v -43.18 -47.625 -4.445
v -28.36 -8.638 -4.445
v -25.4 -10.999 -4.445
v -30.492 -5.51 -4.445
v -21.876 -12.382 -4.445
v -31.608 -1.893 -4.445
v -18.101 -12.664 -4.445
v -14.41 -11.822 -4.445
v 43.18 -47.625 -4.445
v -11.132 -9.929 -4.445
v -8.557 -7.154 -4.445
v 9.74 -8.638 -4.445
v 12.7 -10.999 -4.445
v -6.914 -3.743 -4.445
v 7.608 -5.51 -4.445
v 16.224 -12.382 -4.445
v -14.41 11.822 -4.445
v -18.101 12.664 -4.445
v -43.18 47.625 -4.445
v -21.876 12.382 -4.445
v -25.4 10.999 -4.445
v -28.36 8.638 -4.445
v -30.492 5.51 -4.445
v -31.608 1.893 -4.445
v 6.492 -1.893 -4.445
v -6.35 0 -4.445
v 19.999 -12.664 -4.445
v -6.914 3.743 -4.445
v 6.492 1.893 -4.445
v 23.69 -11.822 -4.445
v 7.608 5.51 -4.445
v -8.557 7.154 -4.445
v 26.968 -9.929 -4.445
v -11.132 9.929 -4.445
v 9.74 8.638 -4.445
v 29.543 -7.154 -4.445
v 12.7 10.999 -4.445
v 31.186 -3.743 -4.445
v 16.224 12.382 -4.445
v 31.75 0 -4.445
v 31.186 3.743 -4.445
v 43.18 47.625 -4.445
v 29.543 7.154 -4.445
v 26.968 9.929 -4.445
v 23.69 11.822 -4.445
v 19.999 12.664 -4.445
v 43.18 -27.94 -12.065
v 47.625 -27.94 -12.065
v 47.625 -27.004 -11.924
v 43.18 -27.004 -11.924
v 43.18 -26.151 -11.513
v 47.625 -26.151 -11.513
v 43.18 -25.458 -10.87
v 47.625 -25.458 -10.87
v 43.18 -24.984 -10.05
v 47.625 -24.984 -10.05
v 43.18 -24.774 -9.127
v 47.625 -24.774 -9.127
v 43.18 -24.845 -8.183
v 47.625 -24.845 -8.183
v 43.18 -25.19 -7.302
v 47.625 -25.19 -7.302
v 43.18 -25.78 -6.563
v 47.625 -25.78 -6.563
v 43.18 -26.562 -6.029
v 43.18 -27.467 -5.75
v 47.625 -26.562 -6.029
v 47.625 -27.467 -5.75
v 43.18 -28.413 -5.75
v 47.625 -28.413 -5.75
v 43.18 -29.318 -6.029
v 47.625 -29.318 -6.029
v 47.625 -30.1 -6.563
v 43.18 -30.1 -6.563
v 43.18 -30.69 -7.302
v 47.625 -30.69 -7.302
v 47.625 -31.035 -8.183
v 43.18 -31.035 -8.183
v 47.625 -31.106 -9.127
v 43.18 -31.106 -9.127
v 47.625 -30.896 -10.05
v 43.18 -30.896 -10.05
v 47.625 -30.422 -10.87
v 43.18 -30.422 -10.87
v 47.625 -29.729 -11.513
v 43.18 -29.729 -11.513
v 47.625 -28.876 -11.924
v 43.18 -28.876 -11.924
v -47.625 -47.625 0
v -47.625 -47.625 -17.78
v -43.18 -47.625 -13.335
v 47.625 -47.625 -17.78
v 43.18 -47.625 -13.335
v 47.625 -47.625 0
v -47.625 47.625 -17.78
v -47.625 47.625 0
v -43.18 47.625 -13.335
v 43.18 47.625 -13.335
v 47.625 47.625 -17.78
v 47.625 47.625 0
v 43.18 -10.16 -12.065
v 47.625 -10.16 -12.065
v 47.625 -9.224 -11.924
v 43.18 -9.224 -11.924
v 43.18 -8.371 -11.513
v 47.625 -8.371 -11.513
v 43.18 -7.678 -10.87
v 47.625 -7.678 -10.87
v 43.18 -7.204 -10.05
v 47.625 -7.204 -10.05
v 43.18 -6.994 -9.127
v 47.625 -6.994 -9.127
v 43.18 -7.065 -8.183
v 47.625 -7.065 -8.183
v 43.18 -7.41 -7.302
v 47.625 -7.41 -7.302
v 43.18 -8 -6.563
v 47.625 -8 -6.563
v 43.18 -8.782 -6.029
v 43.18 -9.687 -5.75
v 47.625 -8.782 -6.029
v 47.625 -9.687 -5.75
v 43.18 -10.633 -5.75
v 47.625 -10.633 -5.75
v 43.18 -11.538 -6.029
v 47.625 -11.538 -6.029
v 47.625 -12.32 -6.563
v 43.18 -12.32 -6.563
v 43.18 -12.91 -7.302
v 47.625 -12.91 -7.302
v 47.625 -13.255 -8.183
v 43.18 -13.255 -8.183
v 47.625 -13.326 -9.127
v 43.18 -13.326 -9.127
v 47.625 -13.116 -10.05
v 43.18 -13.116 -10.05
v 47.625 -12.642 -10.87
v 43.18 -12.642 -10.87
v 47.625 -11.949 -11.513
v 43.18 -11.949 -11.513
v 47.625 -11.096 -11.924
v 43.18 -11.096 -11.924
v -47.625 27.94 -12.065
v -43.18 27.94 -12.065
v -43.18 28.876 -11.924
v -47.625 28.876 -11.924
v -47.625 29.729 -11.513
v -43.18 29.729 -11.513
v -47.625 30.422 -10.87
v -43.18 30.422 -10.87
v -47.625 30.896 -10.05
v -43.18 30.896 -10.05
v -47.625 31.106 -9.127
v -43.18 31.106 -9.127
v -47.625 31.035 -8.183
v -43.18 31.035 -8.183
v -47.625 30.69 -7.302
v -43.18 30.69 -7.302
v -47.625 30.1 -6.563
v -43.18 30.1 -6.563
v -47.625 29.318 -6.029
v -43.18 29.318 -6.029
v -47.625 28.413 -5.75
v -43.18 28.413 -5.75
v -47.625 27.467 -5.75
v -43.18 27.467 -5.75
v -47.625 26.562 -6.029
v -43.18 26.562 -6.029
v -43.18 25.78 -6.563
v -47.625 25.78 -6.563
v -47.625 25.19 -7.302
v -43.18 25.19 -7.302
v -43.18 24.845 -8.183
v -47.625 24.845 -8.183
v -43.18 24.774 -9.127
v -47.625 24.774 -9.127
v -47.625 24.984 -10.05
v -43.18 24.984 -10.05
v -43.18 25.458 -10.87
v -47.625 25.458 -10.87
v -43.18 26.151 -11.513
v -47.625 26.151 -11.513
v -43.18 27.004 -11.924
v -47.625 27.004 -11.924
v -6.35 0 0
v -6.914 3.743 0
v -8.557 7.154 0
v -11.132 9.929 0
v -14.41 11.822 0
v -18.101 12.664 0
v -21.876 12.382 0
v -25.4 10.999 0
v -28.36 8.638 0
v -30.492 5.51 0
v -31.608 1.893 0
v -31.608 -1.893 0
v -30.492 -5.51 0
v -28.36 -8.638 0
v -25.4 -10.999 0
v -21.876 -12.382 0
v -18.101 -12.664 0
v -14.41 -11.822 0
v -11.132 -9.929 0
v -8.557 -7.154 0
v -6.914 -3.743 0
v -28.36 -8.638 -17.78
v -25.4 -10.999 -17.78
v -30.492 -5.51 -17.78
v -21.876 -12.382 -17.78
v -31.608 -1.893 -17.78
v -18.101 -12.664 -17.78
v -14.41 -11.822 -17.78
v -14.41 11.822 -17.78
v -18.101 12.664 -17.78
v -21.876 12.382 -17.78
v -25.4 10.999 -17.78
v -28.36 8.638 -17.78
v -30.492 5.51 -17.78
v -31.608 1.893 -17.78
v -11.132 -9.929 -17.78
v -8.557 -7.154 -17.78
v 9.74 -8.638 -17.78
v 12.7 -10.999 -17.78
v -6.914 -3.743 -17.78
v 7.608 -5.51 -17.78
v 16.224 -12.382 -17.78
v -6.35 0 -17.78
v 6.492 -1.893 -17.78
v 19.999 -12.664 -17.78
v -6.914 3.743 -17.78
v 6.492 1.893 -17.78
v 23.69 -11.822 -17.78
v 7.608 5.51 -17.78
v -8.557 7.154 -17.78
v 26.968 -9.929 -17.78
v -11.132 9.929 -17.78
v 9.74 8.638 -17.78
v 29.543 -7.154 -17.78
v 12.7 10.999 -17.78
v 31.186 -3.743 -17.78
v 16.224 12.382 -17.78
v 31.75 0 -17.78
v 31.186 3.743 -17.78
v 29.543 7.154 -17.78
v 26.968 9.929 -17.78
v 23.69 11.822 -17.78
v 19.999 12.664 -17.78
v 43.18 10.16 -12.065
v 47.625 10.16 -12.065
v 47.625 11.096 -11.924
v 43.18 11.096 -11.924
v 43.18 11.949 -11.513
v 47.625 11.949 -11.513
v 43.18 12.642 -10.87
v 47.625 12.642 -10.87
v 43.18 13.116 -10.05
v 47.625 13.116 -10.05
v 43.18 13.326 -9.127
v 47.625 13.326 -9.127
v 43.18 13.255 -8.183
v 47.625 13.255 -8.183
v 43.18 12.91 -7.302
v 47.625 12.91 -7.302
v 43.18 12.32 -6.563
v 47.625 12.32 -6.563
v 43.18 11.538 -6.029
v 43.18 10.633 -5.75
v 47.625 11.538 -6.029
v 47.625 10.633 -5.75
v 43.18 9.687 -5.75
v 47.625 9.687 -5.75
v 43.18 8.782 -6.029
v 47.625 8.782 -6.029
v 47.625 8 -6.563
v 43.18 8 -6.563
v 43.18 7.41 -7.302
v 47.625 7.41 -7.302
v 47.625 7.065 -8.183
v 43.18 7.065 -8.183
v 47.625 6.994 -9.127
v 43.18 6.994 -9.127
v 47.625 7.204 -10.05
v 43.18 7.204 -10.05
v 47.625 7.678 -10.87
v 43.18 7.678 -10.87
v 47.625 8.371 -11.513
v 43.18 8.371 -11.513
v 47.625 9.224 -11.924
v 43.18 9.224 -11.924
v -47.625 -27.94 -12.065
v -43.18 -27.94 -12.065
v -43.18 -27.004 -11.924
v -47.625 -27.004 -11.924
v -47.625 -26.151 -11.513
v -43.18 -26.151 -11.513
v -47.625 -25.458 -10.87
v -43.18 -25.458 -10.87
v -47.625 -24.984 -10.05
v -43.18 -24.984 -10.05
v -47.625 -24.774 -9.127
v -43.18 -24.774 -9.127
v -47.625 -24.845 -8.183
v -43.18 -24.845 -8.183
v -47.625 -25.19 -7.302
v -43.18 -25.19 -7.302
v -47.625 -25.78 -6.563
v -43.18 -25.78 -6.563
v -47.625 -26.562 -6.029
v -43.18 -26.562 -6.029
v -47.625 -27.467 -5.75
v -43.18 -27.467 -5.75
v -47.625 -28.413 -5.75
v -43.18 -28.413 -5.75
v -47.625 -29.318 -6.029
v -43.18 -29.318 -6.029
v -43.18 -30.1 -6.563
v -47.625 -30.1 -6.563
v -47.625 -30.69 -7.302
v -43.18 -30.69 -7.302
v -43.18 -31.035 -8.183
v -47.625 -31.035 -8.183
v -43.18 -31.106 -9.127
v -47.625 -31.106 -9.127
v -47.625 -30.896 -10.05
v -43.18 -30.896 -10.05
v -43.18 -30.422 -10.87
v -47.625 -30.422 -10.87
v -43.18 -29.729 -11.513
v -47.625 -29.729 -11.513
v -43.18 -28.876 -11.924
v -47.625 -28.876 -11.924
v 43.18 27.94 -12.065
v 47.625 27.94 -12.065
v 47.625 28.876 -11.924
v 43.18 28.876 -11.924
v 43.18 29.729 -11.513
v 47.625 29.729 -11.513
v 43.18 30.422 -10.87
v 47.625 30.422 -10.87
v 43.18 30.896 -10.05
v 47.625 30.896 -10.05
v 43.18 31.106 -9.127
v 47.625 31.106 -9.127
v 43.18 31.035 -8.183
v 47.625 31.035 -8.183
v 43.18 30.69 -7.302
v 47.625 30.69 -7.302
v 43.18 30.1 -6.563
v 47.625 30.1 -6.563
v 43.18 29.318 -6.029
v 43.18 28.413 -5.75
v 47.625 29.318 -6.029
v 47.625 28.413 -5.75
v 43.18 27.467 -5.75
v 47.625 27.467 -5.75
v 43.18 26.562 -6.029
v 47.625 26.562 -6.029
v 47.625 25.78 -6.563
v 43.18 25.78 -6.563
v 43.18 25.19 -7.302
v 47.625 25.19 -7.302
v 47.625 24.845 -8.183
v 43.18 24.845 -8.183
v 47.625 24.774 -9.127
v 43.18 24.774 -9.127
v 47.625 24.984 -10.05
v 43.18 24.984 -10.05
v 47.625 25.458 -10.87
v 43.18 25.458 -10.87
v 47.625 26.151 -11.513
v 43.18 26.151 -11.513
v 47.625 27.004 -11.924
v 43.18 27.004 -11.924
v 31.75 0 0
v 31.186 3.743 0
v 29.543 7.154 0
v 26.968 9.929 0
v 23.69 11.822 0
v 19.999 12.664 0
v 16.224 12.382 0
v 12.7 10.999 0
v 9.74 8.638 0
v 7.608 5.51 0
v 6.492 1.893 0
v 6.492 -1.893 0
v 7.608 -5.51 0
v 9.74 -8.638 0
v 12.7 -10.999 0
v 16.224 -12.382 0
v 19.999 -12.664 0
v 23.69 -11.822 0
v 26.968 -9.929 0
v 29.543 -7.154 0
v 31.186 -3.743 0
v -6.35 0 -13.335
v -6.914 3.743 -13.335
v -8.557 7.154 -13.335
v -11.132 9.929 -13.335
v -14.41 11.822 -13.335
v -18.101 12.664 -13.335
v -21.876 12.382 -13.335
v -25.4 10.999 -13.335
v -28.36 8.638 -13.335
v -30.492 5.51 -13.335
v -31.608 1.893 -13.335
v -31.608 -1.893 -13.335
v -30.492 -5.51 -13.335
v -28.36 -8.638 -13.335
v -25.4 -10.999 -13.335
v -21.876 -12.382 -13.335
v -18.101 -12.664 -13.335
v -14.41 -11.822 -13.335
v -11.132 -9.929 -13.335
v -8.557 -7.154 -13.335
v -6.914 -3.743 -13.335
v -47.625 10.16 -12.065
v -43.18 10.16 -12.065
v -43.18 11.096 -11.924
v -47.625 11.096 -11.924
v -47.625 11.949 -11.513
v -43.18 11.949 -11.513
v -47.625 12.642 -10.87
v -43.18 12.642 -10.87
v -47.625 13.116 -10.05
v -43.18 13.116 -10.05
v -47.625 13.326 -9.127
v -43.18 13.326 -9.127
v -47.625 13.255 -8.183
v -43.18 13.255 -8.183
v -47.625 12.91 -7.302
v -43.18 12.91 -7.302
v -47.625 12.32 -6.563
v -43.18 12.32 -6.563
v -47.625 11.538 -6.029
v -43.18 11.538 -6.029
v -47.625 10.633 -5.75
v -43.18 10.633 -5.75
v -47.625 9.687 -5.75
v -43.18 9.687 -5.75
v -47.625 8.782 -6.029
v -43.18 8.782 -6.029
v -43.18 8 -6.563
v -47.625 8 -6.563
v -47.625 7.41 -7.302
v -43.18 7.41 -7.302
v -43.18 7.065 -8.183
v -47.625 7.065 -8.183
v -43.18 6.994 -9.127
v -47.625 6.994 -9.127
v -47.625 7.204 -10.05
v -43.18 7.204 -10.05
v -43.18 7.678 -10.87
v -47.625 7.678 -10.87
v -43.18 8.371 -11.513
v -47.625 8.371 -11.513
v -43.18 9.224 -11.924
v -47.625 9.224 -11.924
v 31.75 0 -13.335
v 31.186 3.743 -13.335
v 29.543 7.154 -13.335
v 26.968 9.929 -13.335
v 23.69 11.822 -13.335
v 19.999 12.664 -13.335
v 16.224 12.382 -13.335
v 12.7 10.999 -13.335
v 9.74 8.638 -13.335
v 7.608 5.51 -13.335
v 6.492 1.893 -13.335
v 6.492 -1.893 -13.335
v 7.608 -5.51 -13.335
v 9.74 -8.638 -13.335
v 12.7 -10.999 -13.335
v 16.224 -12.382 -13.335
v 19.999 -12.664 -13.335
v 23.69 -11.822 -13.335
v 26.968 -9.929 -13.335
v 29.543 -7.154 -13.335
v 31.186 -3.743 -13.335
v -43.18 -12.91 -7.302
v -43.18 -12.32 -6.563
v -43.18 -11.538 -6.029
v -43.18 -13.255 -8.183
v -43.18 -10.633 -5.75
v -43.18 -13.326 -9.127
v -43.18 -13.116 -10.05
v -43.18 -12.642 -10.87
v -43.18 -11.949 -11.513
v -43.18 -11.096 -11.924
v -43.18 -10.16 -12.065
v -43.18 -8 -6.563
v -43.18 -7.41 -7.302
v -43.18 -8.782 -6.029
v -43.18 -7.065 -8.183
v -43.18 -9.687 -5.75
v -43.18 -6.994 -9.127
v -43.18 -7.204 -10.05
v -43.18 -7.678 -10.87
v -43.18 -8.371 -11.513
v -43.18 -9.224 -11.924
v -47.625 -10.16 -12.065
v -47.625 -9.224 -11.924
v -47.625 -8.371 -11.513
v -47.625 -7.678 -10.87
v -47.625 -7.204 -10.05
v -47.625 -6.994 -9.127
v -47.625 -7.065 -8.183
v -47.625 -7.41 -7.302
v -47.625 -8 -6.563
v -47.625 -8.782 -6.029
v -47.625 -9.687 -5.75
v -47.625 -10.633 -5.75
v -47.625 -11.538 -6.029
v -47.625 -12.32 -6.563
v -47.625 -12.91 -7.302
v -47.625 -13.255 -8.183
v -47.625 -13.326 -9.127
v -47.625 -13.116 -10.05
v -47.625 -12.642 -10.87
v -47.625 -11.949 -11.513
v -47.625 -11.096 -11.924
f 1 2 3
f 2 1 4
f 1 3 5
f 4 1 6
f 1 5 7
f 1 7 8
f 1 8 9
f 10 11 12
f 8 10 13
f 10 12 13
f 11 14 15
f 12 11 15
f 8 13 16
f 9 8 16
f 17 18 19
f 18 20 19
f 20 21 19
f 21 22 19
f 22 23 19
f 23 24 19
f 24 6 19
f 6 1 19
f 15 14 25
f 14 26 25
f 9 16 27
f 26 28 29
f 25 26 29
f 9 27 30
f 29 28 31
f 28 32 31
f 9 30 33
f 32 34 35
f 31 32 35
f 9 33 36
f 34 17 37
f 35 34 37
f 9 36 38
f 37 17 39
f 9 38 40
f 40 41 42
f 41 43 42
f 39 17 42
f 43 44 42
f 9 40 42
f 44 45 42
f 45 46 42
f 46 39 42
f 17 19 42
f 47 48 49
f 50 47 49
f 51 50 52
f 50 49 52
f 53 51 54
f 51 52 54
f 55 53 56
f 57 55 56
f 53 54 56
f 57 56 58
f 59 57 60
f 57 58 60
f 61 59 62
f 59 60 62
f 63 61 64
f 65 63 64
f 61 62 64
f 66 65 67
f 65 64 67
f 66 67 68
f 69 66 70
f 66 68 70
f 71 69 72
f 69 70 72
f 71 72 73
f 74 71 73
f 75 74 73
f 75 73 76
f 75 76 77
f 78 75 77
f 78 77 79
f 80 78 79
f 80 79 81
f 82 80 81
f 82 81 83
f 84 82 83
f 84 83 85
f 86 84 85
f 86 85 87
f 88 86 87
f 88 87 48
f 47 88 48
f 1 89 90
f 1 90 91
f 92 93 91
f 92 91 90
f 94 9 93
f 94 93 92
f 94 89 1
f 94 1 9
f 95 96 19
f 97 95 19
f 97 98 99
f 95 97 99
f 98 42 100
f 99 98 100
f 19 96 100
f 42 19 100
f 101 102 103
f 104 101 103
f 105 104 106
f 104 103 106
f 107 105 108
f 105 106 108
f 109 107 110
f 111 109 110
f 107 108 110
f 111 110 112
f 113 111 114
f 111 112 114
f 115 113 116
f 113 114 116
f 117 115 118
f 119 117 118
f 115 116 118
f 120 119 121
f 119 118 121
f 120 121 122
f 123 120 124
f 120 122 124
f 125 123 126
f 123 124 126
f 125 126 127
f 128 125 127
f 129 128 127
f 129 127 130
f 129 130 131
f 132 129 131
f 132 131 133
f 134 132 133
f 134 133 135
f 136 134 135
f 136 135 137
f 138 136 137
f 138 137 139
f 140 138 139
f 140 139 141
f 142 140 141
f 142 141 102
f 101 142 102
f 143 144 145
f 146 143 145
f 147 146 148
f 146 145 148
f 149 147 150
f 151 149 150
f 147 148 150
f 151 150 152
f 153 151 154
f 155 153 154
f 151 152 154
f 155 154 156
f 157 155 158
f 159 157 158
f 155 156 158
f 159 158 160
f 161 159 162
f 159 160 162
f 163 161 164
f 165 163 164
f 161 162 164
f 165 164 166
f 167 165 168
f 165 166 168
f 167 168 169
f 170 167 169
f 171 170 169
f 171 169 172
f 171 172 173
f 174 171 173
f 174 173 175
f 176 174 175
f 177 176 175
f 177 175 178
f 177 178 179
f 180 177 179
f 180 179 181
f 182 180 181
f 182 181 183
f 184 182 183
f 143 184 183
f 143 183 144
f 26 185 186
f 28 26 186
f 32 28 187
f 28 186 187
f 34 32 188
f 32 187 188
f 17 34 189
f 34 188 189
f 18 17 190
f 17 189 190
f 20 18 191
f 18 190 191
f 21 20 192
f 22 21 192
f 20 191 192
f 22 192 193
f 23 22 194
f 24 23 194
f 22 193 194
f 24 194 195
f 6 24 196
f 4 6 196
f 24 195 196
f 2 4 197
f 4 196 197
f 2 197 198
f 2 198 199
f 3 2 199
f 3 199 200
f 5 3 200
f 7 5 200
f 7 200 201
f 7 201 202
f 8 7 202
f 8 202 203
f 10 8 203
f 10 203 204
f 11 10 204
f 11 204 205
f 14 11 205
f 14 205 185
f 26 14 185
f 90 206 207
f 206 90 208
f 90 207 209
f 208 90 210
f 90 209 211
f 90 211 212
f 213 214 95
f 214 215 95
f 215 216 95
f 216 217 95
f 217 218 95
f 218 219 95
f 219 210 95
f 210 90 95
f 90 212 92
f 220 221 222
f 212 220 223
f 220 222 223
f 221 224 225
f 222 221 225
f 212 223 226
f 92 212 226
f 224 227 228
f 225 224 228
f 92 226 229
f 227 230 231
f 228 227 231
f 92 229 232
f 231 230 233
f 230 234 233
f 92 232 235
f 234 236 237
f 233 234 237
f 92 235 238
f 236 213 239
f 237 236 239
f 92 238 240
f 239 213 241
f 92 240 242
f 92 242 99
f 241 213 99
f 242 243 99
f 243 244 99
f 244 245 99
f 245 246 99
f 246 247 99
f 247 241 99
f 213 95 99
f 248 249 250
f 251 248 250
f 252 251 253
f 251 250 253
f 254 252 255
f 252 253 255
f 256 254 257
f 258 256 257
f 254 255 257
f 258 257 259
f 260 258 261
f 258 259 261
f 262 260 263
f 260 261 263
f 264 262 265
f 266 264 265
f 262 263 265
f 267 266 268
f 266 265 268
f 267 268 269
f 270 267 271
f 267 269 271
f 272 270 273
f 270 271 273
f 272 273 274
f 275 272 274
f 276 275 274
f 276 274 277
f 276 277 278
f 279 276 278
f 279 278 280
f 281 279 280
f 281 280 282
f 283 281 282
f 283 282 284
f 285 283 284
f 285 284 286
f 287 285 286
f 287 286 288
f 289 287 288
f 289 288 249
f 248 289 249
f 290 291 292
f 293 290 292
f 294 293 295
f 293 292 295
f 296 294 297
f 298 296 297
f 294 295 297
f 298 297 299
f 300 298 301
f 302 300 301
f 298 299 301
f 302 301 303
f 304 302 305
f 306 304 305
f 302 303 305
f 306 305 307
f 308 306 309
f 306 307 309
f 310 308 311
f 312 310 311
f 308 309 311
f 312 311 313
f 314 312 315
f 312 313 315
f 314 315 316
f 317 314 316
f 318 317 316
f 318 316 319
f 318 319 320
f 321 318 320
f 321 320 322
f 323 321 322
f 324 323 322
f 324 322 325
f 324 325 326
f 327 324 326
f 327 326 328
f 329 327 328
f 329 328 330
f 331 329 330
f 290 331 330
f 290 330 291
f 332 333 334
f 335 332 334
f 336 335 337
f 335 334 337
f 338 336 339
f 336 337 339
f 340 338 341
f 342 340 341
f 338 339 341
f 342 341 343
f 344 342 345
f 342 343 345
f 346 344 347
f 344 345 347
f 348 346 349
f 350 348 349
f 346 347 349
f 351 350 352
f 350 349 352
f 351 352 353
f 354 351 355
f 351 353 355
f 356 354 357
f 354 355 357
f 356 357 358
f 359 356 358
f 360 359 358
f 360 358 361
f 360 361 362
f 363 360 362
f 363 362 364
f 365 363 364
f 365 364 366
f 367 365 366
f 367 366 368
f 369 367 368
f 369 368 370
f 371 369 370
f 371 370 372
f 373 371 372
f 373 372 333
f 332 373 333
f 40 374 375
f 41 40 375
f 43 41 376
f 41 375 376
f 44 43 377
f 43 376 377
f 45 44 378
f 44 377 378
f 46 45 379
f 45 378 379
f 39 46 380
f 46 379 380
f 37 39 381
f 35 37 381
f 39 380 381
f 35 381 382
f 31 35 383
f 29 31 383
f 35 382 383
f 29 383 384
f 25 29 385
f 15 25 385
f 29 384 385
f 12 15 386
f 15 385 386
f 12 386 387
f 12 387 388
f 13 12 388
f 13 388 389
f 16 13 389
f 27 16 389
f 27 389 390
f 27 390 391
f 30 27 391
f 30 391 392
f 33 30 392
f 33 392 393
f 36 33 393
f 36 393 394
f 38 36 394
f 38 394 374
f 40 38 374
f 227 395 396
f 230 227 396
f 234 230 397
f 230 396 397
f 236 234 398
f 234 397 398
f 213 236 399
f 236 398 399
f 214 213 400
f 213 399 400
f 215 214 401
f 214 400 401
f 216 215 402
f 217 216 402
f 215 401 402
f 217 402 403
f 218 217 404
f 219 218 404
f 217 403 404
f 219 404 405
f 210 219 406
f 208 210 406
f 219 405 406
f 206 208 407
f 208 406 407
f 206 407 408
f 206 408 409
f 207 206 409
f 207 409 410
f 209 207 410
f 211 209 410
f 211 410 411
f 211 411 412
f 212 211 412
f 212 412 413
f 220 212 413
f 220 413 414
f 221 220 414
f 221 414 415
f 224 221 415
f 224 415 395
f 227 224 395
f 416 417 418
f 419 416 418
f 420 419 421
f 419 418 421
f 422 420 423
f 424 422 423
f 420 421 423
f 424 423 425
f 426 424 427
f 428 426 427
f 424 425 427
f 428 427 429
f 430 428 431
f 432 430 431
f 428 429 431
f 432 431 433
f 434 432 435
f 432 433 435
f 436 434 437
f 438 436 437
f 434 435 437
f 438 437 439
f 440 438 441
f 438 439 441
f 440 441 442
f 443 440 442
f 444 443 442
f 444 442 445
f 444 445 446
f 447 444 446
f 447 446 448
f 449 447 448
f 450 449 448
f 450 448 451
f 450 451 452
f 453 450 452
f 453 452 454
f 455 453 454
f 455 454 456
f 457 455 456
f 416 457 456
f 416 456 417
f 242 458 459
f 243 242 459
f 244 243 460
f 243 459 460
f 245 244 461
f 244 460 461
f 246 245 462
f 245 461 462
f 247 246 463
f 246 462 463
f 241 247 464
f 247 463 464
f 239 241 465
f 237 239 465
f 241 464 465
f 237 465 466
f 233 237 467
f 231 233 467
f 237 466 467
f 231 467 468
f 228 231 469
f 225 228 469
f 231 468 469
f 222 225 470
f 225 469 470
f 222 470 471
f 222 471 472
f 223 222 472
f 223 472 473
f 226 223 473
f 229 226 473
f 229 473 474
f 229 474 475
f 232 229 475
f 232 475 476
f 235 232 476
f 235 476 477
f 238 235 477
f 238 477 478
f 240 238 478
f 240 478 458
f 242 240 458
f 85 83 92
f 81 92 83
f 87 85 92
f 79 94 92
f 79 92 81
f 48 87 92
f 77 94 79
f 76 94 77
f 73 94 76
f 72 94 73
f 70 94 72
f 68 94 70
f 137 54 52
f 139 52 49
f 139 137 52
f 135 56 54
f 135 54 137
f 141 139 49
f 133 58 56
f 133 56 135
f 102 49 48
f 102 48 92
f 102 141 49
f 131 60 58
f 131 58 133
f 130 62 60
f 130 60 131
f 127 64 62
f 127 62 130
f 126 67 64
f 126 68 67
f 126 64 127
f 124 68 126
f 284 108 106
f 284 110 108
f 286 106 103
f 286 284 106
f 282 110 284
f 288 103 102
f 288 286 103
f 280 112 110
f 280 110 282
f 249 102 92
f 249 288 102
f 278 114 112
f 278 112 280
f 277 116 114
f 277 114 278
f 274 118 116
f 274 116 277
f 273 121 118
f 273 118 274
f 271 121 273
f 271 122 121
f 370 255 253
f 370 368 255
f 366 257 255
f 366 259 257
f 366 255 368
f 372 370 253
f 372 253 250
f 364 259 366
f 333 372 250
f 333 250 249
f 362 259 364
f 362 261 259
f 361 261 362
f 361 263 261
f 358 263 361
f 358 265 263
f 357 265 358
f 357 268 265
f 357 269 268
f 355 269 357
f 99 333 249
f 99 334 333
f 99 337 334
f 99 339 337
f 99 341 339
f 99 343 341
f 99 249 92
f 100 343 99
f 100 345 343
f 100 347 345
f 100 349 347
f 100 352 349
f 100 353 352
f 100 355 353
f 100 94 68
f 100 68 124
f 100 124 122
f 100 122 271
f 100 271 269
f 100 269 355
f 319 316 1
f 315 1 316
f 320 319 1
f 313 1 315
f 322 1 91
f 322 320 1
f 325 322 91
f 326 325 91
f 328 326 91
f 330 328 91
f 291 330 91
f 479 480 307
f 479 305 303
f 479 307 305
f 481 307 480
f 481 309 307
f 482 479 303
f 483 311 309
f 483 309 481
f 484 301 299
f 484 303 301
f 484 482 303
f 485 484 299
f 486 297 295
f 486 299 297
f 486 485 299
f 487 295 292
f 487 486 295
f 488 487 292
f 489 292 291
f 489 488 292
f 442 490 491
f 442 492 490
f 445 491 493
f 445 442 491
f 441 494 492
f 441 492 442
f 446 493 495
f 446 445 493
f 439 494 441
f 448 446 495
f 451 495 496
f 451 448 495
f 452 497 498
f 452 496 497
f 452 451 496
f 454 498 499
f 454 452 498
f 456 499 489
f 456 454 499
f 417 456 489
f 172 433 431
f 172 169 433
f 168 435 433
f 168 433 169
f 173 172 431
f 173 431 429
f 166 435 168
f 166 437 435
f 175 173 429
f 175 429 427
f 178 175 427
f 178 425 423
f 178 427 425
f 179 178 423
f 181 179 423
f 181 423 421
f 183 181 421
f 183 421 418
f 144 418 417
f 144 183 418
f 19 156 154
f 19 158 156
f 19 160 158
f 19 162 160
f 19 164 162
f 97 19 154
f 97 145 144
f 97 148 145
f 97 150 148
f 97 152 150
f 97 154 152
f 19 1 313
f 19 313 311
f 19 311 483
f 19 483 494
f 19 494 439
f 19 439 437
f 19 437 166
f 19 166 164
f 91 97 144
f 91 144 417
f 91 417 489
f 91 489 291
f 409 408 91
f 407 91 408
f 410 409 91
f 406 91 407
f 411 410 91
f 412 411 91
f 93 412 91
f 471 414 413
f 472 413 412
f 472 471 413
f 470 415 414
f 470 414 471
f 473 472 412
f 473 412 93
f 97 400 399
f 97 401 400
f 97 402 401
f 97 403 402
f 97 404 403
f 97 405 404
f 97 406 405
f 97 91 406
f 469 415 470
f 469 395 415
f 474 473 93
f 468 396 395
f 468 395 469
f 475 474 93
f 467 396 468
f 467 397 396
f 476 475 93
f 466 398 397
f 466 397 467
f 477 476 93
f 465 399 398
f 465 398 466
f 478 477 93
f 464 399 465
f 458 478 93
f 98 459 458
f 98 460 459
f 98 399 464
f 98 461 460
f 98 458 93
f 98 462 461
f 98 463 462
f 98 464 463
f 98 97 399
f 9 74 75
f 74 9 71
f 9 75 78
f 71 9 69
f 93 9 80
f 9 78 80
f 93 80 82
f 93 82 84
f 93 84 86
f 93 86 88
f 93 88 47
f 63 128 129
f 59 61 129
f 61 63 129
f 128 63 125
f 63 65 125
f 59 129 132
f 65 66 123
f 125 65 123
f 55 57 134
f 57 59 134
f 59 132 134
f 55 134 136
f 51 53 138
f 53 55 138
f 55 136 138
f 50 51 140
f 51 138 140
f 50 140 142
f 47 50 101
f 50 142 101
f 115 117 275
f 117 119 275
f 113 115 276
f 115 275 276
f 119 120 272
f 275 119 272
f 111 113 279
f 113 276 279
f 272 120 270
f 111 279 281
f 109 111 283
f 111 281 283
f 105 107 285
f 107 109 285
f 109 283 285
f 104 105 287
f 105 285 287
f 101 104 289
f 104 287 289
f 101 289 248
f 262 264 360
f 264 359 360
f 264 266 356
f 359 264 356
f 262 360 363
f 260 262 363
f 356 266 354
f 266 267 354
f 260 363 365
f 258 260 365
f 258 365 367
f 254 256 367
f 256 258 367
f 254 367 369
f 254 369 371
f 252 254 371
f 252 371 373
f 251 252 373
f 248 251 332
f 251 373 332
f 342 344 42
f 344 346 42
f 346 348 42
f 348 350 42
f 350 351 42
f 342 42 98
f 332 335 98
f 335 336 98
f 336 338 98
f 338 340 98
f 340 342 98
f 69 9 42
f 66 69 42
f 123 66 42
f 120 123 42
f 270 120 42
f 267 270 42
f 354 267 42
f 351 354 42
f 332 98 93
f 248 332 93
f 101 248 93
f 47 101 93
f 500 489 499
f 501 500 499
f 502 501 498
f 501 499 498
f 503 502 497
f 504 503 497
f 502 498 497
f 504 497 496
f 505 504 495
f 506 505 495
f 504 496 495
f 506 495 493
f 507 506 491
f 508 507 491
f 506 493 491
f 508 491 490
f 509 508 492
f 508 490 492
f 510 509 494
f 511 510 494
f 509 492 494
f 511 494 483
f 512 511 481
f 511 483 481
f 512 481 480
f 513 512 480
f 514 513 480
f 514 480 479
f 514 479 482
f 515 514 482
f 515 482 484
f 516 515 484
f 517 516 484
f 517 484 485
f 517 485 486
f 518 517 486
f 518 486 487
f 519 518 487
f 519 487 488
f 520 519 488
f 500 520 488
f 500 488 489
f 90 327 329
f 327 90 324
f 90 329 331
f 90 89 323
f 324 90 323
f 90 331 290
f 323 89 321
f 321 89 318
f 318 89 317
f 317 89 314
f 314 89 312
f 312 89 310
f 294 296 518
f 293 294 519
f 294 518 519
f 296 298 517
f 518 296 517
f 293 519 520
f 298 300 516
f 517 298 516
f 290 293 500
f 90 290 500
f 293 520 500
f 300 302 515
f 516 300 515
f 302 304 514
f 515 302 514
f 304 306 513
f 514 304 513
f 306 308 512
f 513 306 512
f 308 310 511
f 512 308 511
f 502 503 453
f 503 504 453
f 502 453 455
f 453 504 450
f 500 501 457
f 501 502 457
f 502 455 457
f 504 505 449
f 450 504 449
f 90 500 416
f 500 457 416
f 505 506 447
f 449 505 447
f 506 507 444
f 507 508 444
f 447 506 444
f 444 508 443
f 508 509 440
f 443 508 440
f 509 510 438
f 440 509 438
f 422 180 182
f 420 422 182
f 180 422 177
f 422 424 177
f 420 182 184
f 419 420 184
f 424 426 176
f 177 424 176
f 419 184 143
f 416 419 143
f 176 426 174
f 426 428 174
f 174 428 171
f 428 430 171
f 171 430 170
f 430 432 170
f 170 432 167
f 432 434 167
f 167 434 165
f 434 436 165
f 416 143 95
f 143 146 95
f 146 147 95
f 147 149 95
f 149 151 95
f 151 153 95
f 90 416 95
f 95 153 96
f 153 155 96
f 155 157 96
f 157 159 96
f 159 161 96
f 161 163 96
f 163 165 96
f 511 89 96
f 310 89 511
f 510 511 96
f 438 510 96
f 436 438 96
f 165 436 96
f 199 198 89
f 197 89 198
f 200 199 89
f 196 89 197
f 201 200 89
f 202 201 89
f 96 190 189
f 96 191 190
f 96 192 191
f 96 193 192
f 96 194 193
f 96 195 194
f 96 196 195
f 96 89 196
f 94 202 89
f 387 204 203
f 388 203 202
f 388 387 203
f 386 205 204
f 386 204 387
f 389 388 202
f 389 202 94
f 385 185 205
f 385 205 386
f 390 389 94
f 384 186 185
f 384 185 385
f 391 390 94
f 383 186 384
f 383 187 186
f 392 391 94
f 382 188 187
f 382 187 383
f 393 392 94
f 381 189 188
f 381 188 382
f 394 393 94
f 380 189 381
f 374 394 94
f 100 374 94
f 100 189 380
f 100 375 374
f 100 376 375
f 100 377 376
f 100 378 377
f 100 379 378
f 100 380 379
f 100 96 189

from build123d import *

# Parameters (mm, degrees)
SKETCH1_W           = 95.25
SKETCH1_H           = 95.25
BOSS_EXTRUDE1_DEPTH = 17.78
SKETCH2_W           = 86.36
SKETCH2_H           = 8.89
CUT_EXTRUDE1_DEPTH  = 108.966807515
SKETCH3_R           = 12.7
CUT_EXTRUDE2_DEPTH  = 70.659239516
SKETCH4_R           = 3.175
CUT_EXTRUDE3_DEPTH  = 108.966807515


with BuildPart() as part:
    # Sketch1 → Boss-Extrude1 (new body)
    with BuildSketch(Plane.XY):
        Rectangle(SKETCH1_W, SKETCH1_H)
    extrude(amount=-BOSS_EXTRUDE1_DEPTH)

    # Sketch2 → Cut-Extrude1 (cut, through all)
    with BuildSketch(Plane(origin=(0, 47.625, 0), x_dir=(1, 0, 0), z_dir=(0, 1, 0))):
        with Locations((0, 8.89)):
            Rectangle(SKETCH2_W, SKETCH2_H)
    extrude(amount=-CUT_EXTRUDE1_DEPTH, mode=Mode.SUBTRACT)

    # Sketch3 → Cut-Extrude2 (cut, through all)
    with BuildSketch(Plane.XY):
        with Locations((19.05, 0)):
            Circle(SKETCH3_R)
        with Locations((-19.05, 0)):
            Circle(SKETCH3_R)
    extrude(amount=-CUT_EXTRUDE2_DEPTH, mode=Mode.SUBTRACT)

    # Sketch4 → Cut-Extrude3 (cut, through all)
    with BuildSketch(Plane(origin=(47.625, 0, 0), x_dir=(0, 0, -1), z_dir=(1, 0, 0))):
        with Locations((8.89, 10.16)):
            Circle(SKETCH4_R)
        with Locations((8.89, -10.16)):
            Circle(SKETCH4_R)
        with Locations((8.89, -27.94)):
            Circle(SKETCH4_R)
        with Locations((8.89, 27.94)):
            Circle(SKETCH4_R)
    extrude(amount=-CUT_EXTRUDE3_DEPTH, mode=Mode.SUBTRACT)


solid = part.part
